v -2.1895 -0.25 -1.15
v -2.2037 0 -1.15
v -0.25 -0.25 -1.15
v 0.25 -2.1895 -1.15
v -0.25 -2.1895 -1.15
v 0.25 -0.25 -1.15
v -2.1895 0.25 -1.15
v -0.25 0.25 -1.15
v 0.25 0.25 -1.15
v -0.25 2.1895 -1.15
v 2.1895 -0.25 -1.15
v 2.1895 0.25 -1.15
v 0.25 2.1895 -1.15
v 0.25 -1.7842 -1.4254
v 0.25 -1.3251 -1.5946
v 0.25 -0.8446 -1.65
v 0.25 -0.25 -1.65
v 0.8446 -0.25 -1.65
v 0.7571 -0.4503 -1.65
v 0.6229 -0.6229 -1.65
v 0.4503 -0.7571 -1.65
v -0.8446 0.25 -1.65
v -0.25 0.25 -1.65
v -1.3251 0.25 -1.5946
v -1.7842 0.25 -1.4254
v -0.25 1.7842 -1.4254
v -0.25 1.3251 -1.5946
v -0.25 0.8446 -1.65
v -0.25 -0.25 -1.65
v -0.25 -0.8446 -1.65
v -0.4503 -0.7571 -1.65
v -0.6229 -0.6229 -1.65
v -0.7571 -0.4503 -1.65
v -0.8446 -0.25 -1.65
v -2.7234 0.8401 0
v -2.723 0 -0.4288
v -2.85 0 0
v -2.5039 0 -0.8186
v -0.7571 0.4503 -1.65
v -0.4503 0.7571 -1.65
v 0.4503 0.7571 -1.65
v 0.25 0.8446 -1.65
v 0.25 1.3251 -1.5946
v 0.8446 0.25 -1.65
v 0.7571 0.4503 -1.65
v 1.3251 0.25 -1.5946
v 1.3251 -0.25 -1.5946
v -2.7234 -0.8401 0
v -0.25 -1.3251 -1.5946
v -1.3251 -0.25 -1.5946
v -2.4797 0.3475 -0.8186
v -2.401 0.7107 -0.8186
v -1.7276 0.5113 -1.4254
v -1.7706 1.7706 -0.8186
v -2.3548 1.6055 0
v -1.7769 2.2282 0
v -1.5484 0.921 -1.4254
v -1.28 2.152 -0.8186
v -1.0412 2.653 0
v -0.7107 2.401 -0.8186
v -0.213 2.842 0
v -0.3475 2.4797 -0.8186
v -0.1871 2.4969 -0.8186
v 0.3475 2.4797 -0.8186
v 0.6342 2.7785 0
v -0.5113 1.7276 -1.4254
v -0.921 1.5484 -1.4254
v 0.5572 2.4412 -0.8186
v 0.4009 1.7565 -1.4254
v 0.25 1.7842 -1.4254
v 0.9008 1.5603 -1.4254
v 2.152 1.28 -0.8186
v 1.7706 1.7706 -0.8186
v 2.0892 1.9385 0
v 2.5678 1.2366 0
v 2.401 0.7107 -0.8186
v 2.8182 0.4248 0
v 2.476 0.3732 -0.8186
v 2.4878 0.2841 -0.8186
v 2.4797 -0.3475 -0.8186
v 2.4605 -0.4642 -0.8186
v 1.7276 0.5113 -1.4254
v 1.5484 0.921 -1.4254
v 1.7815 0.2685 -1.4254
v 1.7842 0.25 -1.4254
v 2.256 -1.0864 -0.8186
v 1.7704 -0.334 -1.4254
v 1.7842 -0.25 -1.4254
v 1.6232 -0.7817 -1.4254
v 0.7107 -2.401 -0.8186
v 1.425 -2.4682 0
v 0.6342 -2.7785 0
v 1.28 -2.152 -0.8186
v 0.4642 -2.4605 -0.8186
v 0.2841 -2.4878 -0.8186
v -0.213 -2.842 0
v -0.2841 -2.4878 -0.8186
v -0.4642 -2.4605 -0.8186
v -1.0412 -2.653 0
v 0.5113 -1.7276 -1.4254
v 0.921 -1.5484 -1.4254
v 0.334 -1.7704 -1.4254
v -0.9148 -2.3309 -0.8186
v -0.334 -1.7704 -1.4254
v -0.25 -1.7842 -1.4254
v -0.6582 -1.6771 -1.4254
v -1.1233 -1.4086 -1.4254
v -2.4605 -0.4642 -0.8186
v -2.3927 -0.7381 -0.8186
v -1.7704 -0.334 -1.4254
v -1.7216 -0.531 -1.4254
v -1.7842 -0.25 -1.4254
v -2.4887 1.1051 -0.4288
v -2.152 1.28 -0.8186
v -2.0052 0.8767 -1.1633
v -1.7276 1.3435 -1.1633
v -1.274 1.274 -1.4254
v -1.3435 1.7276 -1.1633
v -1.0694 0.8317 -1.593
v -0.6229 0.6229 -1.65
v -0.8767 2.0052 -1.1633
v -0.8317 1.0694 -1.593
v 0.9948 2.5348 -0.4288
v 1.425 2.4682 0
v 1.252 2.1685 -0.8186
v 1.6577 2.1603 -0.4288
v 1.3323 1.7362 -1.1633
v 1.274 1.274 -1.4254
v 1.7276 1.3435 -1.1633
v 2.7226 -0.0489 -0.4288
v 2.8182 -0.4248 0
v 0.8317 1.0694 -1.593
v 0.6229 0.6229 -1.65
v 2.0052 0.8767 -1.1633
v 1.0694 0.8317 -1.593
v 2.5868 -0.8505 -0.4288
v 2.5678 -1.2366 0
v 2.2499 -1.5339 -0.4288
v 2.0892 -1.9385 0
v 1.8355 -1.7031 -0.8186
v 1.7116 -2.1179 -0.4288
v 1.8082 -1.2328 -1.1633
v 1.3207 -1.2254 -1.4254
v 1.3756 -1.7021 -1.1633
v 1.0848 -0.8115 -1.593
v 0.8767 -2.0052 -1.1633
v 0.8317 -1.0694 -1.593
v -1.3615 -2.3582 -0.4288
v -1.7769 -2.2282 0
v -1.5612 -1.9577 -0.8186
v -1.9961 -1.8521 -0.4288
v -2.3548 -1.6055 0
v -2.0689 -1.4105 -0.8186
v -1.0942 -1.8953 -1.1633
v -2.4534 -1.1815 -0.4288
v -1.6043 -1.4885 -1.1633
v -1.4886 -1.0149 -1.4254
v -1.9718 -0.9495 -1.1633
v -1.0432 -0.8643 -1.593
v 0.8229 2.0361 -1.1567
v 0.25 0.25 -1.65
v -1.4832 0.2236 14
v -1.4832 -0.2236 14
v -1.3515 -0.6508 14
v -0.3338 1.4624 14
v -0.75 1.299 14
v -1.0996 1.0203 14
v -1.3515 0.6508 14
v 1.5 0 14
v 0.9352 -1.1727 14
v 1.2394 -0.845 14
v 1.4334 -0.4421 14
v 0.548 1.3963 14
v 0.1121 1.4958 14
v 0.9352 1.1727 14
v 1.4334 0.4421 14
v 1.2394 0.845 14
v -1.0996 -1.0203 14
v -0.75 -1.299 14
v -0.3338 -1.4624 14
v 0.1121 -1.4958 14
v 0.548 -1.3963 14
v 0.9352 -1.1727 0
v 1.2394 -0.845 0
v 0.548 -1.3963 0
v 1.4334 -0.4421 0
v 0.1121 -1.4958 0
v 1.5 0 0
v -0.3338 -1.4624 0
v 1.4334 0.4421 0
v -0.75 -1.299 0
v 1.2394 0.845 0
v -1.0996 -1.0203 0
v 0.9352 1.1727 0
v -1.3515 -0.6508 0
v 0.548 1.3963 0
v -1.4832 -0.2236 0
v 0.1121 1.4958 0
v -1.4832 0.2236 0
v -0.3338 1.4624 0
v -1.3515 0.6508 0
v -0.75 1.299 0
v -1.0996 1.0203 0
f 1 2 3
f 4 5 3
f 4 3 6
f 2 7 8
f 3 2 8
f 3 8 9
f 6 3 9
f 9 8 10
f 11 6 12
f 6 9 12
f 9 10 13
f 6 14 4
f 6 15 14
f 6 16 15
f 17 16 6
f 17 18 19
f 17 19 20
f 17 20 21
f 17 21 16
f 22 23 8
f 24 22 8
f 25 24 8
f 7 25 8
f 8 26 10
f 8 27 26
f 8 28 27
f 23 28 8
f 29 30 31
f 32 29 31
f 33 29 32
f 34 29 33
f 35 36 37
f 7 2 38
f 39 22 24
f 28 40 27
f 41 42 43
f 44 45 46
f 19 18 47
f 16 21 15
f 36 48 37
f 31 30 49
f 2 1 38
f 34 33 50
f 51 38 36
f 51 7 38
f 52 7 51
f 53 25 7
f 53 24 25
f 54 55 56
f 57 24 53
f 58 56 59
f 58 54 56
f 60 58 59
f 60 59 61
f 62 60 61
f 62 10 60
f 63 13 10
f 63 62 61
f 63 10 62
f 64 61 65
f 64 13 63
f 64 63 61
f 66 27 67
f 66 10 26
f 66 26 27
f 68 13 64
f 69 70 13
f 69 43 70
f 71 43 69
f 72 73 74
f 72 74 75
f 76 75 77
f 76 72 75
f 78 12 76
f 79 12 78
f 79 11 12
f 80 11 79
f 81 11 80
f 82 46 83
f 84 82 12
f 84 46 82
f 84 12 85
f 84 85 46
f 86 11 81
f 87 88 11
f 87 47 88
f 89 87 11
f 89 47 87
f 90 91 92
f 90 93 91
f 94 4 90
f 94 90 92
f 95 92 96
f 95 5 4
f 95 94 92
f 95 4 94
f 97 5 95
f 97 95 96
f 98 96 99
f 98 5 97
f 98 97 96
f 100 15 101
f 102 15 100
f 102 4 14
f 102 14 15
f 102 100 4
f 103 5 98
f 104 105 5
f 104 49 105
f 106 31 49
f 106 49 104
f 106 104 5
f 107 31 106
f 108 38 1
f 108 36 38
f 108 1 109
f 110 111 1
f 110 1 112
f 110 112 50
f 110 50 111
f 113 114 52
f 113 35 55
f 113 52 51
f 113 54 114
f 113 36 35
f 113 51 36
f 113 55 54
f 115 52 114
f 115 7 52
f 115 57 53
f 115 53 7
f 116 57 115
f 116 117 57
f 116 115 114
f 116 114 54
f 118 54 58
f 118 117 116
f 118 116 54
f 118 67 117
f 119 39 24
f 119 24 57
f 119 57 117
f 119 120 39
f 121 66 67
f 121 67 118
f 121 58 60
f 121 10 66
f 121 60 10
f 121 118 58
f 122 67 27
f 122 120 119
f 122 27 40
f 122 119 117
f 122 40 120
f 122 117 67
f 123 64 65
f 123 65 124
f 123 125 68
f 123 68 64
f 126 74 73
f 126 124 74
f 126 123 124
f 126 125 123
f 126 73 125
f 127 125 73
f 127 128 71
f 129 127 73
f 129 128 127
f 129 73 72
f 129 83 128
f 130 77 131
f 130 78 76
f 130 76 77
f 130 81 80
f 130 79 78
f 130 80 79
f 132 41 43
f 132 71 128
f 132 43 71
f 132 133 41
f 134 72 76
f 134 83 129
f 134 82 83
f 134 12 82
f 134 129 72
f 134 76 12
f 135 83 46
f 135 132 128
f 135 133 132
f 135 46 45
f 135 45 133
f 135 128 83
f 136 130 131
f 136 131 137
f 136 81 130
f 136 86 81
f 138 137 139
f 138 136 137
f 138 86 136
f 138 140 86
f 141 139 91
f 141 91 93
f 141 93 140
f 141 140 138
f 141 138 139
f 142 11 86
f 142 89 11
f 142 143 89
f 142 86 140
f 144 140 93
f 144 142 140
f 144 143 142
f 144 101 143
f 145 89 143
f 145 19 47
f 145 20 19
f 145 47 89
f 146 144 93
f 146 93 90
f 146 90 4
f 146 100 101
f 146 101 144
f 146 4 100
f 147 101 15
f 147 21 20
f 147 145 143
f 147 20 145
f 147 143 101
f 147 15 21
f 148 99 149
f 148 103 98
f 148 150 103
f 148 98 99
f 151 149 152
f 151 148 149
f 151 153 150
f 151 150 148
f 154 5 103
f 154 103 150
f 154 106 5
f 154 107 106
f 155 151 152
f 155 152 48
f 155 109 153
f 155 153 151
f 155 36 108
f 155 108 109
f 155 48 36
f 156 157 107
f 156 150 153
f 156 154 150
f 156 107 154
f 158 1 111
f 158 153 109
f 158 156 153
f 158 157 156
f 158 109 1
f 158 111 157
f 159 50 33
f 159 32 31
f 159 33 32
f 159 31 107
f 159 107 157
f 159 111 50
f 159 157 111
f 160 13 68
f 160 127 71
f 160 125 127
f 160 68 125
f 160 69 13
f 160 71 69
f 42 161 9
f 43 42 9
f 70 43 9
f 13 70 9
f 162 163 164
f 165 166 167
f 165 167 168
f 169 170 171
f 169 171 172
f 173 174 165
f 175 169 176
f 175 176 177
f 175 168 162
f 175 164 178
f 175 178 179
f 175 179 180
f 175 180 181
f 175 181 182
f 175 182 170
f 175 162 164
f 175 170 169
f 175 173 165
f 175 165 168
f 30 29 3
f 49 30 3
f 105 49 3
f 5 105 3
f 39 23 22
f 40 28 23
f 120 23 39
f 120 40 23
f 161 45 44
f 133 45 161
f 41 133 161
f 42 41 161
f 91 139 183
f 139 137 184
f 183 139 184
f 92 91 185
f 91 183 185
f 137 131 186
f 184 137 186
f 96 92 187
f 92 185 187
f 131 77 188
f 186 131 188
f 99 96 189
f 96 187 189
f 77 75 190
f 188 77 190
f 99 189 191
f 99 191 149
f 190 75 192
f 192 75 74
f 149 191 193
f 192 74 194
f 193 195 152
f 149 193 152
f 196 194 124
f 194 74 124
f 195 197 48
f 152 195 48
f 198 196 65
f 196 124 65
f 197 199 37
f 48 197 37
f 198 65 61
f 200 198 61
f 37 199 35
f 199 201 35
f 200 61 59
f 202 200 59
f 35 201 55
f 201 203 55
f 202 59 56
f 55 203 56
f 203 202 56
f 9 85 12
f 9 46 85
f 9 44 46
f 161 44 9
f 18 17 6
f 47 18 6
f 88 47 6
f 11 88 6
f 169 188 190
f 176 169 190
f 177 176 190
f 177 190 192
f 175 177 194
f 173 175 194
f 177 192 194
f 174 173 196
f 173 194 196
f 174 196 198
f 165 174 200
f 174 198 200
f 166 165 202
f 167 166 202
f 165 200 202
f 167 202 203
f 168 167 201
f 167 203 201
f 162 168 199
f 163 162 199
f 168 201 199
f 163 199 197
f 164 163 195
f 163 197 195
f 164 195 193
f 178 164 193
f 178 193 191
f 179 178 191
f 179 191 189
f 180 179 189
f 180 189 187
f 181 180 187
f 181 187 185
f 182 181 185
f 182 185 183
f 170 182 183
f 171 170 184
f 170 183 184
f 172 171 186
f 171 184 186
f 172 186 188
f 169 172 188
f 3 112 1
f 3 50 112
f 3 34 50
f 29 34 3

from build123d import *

# Parameters (mm, degrees)
SKETCH_1_R          = 1.5
EXTRUDE_1_DEPTH     = 14
SKETCH_2_R          = 2.85
EXTRUDE_2_DEPTH     = 1.65
FILLET_1_R          = 2
CUT_EXTRUDE_1_DEPTH = 0.5


with BuildPart() as part:
    # 草图1 → 凸台-拉伸1 (new body)
    with BuildSketch(Plane.XY):
        Circle(SKETCH_1_R)
    extrude(amount=EXTRUDE_1_DEPTH)

    # 草图2 → 凸台-拉伸2 (add)
    with BuildSketch(Plane(origin=(0, 0, 0), x_dir=(-1, 0, 0), z_dir=(0, 0, -1))):
        Circle(SKETCH_2_R)
    extrude(amount=EXTRUDE_2_DEPTH)

    # 圆角1
    # the kernel refuses this fillet: 2 mm, written as the material it takes off along each edge
    with BuildSketch(Plane(origin=(0, 0, -1.65), x_dir=(-1, 0, 0), z_dir=(0, -1, 0))) as fillet_1_piece_1:
        with BuildLine():
            CenterArc((0.880863133, -2), FILLET_1_R, 10.078658108, 79.921341892)
            Line((0.880863133, 0), (0.880863133, 0.04))
            Line((0.880863133, 0.04), (2.85, 0.04))
            Line((2.85, 0.04), (2.89, 0))
            ThreePointArc((2.89, 0), (2.89, -0.825), (2.889382737, -1.643))
            Line((2.889382737, -1.643), (2.85, -1.65))
        make_face()
    revolve(axis=Axis((0, 0, -1.65), (0, 0, -1)), mode=Mode.SUBTRACT)

    # 草图3 → 切除-拉伸1 (cut)
    with BuildSketch(Plane(origin=(0, 0, -1.65), x_dir=(-1, 0, 0), z_dir=(0, 0, -1))):
        Polygon((2.85, 0.25), (2.85, -0.25), (0.25, -0.25), (0.25, -2.85), (-0.25, -2.85), (-0.25, -0.25), (-2.85, -0.25), (-2.85, 0.25), (-0.25, 0.25), (-0.25, 2.85), (0.25, 2.85), (0.25, 0.25), align=None)
    extrude(amount=-CUT_EXTRUDE_1_DEPTH, mode=Mode.SUBTRACT)


solid = part.part
